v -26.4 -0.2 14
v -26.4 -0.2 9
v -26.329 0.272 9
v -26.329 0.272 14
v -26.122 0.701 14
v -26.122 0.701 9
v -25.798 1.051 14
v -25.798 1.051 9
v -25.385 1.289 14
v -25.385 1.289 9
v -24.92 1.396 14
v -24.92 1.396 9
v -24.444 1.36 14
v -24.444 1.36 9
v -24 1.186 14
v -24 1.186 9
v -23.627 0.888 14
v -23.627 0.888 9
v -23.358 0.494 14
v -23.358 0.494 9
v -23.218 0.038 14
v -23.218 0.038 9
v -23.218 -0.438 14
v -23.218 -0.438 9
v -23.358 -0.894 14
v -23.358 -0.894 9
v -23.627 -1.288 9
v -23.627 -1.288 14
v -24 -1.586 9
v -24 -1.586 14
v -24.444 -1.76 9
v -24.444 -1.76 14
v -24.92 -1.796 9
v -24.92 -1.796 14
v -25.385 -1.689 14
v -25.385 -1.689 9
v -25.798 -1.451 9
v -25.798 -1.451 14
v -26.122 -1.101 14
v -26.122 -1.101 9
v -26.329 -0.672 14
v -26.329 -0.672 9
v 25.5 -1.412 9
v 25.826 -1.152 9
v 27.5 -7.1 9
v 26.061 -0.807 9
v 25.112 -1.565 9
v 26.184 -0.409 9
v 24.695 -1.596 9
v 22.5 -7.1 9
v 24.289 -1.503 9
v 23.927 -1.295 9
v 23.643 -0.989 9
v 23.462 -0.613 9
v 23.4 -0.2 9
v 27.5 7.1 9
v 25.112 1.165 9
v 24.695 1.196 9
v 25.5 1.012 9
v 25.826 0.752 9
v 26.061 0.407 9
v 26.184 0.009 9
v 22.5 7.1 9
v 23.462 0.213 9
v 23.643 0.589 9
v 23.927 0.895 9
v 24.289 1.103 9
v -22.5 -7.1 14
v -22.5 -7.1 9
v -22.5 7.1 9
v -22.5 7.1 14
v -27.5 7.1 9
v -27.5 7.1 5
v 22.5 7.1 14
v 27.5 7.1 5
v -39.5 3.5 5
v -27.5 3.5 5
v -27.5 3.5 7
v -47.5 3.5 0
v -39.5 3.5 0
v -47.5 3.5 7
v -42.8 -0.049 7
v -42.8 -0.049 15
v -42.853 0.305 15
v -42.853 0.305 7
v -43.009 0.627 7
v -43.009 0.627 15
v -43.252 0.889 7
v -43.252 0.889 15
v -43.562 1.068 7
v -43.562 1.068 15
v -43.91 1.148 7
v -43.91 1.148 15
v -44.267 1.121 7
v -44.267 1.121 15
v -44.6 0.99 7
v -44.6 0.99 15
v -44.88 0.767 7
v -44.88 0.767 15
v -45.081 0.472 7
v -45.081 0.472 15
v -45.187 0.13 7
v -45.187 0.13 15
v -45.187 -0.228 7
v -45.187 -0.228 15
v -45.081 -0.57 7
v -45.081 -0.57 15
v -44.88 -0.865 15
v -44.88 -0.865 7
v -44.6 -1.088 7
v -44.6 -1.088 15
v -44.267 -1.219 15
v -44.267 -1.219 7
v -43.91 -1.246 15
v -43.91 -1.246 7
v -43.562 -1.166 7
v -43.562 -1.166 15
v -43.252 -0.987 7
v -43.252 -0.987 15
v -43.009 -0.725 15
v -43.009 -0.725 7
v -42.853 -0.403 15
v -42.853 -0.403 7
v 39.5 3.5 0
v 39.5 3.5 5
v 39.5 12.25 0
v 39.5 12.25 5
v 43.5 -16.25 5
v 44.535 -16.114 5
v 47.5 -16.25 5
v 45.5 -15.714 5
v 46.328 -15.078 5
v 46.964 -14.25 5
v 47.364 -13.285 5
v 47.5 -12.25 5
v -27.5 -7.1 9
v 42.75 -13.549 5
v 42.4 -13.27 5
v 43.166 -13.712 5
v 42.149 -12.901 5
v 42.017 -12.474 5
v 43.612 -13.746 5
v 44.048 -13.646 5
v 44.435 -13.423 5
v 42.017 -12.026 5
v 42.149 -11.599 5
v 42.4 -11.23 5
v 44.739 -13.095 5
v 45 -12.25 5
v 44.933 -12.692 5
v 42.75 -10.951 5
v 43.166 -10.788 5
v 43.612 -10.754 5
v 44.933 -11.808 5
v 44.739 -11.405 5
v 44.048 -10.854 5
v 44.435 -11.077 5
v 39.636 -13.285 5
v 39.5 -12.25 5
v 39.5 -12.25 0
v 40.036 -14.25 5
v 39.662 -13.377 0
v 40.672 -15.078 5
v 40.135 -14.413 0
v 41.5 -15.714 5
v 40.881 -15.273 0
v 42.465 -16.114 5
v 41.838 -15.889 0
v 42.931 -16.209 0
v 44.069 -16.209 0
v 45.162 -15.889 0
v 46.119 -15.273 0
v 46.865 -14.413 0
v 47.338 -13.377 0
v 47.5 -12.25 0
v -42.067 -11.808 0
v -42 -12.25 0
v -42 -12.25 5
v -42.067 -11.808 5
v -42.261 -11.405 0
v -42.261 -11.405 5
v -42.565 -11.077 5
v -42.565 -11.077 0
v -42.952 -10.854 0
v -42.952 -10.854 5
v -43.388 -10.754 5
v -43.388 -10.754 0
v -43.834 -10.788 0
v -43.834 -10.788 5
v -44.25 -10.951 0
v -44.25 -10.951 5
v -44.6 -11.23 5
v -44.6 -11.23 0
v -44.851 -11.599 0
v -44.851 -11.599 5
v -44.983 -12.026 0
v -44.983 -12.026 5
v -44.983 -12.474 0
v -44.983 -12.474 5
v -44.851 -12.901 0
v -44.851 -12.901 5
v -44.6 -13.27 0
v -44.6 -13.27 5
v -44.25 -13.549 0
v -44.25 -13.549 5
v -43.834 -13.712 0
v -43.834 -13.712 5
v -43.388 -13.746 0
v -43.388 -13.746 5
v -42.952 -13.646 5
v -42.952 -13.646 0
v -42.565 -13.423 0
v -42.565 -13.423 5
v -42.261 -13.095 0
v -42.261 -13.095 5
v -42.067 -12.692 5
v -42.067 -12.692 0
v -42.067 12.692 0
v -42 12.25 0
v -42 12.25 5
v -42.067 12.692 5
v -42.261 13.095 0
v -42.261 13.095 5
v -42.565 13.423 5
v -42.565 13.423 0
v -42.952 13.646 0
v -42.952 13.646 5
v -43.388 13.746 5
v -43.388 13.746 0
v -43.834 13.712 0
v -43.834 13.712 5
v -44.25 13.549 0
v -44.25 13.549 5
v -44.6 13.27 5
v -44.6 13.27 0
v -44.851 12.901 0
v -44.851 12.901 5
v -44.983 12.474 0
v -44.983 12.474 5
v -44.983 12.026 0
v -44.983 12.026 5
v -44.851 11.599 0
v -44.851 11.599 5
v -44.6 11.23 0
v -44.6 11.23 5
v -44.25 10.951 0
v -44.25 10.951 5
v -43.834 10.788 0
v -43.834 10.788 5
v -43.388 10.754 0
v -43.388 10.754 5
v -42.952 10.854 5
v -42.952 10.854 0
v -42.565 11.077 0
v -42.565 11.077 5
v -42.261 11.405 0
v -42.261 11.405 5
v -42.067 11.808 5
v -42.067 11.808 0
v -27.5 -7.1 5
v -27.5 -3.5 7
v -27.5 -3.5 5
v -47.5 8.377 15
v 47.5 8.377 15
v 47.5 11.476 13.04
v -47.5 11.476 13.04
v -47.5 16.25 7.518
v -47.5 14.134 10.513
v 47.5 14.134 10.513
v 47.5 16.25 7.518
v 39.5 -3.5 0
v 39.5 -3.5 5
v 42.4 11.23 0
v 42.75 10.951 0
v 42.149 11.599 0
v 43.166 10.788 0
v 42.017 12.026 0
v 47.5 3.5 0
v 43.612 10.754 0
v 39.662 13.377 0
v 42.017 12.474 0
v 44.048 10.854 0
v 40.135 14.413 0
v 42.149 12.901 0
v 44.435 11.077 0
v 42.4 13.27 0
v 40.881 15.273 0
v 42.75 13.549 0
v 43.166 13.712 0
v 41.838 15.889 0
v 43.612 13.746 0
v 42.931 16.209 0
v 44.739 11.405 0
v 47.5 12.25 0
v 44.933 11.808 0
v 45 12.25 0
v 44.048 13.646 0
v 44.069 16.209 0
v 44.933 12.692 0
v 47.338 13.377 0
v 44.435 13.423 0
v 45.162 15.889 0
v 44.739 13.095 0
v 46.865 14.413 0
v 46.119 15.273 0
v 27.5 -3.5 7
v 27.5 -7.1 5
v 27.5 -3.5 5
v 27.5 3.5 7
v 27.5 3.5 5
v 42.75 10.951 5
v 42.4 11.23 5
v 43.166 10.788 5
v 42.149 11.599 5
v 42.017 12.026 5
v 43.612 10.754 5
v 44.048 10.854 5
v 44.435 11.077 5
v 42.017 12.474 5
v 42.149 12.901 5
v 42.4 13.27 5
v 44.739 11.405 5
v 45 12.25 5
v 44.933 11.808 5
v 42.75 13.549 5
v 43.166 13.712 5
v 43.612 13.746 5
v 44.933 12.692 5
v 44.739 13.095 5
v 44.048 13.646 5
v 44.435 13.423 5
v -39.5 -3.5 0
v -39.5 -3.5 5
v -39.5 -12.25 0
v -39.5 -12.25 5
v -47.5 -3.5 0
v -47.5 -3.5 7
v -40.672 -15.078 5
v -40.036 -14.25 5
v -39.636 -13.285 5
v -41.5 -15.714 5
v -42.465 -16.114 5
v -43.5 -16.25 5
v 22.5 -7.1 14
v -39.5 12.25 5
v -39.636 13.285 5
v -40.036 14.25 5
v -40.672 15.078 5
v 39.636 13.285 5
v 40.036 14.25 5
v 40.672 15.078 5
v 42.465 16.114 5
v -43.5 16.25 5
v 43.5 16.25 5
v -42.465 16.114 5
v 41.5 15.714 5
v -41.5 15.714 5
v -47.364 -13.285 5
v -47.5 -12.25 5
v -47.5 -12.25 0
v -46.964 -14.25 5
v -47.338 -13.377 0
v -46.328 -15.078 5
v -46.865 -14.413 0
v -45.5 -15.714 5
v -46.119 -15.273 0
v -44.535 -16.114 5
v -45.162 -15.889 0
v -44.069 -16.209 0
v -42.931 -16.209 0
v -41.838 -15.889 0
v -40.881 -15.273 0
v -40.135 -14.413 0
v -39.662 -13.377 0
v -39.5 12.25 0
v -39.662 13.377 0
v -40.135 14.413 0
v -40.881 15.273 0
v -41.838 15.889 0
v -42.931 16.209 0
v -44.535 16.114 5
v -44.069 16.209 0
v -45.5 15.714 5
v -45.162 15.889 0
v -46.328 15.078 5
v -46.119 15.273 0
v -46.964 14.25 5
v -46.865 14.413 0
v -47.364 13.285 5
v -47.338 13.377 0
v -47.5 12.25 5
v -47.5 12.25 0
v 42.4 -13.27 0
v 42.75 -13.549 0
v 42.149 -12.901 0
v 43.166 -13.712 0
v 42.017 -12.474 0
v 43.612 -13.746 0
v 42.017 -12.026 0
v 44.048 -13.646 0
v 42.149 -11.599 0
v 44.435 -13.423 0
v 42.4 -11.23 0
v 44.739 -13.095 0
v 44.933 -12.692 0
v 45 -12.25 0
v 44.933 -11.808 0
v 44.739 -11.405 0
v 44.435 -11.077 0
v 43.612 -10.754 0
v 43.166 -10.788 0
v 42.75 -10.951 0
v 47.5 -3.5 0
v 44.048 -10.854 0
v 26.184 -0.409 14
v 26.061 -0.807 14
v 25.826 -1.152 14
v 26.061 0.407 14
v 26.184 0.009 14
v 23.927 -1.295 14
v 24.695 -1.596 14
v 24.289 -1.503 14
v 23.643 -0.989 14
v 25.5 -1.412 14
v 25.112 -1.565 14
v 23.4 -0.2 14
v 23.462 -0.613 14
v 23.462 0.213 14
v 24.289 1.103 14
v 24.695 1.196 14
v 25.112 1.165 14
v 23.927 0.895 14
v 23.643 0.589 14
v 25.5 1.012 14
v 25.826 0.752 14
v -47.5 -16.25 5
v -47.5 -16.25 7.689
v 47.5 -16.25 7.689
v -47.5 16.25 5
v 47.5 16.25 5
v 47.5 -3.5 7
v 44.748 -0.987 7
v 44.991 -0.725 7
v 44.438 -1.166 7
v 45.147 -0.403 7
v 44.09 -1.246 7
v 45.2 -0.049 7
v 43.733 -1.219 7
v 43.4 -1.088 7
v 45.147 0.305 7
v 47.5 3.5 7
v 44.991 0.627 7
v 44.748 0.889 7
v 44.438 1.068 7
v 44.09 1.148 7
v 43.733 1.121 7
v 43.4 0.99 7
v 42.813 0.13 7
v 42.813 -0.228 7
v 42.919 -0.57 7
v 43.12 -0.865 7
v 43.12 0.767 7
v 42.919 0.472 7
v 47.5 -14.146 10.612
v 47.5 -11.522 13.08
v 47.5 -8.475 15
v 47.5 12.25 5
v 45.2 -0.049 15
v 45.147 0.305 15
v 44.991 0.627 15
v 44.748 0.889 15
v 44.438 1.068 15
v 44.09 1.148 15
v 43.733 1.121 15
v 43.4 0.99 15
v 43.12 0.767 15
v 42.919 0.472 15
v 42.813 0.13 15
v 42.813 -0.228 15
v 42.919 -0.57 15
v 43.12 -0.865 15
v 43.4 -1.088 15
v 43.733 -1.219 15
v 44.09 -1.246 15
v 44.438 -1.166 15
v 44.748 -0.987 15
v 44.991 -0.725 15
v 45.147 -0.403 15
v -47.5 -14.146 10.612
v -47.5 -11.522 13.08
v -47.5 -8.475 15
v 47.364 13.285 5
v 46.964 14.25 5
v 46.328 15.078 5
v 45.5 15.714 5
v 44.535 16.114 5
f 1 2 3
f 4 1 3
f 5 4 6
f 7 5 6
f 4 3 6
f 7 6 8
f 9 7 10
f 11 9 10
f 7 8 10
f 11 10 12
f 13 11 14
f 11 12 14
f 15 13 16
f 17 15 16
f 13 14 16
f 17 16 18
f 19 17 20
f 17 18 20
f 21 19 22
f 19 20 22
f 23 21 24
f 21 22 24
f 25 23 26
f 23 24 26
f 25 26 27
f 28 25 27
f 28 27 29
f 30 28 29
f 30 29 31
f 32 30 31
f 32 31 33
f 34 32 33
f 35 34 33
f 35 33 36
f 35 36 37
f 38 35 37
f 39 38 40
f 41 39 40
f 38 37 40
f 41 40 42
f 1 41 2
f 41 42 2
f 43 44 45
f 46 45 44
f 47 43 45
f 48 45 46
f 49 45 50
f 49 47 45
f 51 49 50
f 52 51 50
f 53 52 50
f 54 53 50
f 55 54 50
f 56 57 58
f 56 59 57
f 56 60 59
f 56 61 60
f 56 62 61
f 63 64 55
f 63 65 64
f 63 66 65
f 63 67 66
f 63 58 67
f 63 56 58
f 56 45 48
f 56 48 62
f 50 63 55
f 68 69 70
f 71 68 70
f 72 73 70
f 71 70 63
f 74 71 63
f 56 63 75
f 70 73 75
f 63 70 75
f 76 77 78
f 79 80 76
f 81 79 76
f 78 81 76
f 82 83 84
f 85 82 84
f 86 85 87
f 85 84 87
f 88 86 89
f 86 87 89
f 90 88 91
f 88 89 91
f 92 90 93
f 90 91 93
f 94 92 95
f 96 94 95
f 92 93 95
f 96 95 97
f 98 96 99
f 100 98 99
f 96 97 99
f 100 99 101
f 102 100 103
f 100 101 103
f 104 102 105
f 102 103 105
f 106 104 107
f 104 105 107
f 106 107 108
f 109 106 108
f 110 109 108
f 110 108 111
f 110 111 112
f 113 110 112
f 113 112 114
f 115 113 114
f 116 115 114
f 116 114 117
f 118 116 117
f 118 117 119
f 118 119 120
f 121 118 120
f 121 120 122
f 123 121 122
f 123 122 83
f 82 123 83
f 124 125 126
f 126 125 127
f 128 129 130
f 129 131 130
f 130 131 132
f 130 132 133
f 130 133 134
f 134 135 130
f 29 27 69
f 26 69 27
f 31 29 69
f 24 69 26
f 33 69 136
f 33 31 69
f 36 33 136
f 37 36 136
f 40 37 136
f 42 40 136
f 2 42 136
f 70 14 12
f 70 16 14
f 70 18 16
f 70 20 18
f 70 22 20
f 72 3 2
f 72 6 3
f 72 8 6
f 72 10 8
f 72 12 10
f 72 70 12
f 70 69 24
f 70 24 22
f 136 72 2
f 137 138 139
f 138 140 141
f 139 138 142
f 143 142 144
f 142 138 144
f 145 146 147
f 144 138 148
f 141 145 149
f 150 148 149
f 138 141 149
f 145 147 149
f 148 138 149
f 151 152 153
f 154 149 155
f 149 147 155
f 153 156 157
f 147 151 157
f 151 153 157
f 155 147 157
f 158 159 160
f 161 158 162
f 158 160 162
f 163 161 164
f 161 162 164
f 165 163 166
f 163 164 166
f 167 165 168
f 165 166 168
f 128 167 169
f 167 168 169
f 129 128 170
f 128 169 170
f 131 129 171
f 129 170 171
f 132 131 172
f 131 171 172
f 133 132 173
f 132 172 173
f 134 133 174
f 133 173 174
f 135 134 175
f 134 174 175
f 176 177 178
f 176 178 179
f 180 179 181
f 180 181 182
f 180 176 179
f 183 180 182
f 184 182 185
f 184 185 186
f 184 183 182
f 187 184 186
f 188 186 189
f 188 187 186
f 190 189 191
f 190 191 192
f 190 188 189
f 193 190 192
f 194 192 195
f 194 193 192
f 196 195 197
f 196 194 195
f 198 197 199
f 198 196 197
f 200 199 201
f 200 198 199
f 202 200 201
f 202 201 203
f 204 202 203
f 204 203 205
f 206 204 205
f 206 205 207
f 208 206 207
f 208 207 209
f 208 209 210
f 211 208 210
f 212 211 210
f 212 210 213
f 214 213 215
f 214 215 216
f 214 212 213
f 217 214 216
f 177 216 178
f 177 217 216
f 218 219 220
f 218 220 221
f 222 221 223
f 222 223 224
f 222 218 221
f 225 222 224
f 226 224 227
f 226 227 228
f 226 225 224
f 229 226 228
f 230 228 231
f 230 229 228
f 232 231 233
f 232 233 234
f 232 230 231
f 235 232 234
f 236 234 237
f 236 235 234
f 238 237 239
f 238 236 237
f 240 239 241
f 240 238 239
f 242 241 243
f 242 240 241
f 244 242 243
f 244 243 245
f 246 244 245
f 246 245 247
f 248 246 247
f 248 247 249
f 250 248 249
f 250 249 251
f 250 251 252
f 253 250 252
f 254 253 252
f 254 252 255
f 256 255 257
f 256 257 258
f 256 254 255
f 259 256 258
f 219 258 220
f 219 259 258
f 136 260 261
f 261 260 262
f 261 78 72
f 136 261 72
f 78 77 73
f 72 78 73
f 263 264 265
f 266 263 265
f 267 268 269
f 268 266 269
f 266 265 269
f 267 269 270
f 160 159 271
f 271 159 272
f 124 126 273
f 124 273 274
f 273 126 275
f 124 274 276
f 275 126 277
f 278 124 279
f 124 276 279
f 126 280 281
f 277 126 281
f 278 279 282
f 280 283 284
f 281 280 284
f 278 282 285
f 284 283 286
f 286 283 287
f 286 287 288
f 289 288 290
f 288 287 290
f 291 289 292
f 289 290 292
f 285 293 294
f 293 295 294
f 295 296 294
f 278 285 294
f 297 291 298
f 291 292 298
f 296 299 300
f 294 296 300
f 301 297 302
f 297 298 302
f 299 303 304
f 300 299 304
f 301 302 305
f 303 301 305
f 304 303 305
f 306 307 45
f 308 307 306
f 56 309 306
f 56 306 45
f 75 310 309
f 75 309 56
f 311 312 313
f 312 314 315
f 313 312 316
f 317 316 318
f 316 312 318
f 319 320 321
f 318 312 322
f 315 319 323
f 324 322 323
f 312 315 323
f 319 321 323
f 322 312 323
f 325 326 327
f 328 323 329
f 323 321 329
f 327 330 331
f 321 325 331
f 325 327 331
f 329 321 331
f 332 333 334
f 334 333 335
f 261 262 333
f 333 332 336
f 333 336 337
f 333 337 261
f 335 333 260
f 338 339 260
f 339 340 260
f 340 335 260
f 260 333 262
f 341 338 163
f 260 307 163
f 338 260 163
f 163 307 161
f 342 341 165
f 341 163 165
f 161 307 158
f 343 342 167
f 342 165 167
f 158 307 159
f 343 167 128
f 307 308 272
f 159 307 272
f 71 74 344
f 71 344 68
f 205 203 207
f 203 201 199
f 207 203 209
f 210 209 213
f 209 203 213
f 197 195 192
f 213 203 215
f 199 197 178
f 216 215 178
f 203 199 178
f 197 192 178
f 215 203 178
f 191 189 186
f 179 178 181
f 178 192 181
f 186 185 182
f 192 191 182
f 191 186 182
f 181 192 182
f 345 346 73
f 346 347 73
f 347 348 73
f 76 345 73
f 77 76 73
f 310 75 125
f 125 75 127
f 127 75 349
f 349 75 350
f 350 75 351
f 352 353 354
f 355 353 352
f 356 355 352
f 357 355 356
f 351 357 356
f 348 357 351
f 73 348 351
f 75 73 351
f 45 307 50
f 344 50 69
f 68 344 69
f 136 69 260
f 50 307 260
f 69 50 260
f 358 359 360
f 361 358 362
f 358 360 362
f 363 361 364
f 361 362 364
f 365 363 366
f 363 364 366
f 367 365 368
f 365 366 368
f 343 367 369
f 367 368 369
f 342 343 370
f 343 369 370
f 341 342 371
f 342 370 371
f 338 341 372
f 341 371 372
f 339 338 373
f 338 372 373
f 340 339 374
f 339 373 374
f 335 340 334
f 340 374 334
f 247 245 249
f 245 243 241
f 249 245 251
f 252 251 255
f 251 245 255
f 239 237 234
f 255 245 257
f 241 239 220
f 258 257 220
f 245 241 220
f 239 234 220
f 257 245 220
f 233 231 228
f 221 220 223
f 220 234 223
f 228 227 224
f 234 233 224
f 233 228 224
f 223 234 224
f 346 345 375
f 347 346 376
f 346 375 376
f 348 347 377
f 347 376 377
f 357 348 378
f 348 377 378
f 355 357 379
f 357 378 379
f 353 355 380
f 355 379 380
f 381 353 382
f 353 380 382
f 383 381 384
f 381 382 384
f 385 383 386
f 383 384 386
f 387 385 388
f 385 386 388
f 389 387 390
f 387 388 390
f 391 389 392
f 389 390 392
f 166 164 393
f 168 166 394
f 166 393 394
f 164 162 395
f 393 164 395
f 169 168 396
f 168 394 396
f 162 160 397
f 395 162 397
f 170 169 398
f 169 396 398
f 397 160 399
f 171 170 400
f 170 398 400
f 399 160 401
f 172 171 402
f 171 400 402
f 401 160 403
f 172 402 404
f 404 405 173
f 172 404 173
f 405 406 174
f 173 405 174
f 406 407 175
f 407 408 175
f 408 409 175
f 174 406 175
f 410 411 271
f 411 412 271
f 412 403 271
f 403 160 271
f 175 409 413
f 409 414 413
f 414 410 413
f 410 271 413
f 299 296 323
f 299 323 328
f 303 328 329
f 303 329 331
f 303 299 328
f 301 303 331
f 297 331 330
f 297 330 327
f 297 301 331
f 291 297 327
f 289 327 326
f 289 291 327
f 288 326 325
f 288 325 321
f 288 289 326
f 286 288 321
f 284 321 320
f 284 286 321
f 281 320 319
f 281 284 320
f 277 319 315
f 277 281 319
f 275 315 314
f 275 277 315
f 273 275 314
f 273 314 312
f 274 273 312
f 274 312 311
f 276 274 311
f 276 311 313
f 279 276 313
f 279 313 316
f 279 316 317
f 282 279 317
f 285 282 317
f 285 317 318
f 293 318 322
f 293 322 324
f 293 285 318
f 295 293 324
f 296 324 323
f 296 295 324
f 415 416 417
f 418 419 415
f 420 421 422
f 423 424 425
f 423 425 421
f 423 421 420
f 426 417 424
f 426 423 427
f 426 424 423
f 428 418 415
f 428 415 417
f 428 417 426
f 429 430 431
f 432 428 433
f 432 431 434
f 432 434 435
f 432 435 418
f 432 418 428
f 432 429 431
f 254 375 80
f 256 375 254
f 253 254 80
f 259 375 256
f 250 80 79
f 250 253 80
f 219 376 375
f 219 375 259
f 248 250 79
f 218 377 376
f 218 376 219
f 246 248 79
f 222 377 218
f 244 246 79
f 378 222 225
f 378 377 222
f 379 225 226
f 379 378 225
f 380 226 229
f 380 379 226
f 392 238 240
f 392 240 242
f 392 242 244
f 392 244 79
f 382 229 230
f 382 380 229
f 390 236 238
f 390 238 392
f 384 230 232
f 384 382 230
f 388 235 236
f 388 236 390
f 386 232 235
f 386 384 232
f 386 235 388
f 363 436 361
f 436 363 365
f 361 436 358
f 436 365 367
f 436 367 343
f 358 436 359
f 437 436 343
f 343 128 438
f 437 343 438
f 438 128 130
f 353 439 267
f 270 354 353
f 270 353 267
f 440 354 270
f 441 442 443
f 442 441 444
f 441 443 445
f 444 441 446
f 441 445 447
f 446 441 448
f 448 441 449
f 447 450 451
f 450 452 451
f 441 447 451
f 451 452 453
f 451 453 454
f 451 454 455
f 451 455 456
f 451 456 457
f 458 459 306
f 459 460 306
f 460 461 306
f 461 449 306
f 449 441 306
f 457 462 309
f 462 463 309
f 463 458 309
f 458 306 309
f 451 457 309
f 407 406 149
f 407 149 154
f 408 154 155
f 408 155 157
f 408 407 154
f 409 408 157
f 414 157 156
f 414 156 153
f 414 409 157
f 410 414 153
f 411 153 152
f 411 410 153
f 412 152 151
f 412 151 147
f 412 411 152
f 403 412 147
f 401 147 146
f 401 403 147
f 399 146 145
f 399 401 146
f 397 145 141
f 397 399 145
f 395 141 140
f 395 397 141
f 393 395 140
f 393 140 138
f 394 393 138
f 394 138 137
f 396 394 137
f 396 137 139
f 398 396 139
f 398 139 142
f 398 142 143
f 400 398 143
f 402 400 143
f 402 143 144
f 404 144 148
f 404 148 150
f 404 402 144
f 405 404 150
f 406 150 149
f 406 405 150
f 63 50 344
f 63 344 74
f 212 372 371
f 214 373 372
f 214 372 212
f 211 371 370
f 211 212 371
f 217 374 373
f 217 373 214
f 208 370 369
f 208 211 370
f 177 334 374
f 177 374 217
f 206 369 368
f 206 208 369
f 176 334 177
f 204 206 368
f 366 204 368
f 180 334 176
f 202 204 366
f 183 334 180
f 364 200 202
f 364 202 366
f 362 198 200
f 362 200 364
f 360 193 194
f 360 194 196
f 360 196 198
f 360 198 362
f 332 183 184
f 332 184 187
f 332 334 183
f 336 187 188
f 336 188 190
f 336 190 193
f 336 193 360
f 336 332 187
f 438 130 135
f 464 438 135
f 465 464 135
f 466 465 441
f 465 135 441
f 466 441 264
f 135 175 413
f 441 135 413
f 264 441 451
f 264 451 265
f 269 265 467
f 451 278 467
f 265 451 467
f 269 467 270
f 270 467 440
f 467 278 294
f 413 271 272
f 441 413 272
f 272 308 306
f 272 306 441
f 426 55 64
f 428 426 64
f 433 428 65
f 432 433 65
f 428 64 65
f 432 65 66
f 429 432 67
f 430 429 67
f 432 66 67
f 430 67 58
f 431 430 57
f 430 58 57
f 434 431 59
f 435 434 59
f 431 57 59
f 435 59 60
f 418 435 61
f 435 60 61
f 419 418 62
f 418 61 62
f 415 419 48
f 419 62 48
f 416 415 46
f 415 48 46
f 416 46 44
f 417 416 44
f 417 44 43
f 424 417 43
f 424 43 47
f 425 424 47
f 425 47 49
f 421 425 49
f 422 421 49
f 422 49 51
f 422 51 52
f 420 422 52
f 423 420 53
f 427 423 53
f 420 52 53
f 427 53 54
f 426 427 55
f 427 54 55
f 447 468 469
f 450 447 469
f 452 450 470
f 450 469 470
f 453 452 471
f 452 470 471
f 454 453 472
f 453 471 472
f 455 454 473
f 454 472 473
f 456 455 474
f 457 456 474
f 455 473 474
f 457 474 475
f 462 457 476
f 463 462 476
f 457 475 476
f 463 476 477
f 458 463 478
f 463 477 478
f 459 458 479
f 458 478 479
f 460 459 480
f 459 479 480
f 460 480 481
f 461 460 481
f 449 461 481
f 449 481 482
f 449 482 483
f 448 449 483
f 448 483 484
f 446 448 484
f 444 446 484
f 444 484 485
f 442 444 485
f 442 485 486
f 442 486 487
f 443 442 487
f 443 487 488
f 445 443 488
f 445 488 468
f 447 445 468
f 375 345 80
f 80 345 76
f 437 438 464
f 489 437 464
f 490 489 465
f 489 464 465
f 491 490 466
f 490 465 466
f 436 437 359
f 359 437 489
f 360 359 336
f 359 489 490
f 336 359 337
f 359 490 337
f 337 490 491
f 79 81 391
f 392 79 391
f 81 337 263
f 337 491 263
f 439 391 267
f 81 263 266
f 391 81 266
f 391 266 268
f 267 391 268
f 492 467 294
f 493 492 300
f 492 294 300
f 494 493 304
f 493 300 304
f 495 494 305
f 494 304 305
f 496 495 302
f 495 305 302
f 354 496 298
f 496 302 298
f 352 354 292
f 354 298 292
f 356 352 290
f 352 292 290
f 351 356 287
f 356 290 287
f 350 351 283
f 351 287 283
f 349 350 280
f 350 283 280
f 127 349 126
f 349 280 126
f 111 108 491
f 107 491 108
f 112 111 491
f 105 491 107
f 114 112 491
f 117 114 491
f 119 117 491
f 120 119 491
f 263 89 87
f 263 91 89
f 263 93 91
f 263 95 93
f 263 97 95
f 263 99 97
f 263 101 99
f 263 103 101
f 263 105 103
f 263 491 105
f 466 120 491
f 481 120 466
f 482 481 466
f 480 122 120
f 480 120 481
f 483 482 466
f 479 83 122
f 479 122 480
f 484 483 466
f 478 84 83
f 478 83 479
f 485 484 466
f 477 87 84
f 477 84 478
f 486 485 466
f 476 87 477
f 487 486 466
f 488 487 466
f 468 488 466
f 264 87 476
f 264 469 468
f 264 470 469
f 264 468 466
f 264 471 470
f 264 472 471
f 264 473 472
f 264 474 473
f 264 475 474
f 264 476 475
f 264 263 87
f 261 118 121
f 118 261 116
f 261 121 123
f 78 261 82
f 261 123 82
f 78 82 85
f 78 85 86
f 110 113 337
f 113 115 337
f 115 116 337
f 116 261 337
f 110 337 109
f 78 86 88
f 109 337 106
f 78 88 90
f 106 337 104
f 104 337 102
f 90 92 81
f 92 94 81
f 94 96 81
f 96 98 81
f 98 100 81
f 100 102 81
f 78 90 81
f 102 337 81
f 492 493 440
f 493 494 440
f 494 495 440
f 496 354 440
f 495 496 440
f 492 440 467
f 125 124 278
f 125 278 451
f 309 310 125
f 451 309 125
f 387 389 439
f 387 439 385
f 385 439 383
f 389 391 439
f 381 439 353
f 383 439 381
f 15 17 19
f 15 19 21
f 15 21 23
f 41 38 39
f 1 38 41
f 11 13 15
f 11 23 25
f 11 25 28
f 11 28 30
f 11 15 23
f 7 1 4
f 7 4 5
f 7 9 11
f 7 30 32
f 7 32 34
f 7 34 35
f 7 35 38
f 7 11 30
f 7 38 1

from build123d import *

# Parameters (mm, degrees)
SKETCH1_R             = 4
SKETCH1_R_2           = 1.5
BOSS_EXTRUDE1_DEPTH   = 5
BOSS_EXTRUDE1_2_DEPTH = 5
BOSS_EXTRUDE1_3_DEPTH = 5
BOSS_EXTRUDE1_4_DEPTH = 5
SKETCH2_W             = 95
SKETCH2_H             = 32.5
BOSS_EXTRUDE2_DEPTH   = 10
SKETCH3_W             = 45
SKETCH3_H             = 14.2
CUT_EXTRUDE1_DEPTH    = 9
SKETCH4_W             = 5
SKETCH4_H             = 14.2
SKETCH4_W_2           = 45
CUT_EXTRUDE2_DEPTH    = 4
SKETCH5_R             = 1.4
SKETCH5_R_2           = 1.6
CUT_EXTRUDE3_DEPTH    = 5
BOSS_EXTRUDE3_DEPTH   = 5
CUT_EXTRUDE5_DEPTH    = 96
SKETCH9_W             = 7
SKETCH9_H             = 7
CUT_EXTRUDE6_DEPTH    = 96
SKETCH10_R            = 1.2
CUT_EXTRUDE7_DEPTH    = 16


with BuildPart() as part:
    # Sketch1 → Boss-Extrude1 (new body)
    with BuildSketch(Plane.XY):
        with Locations((-43.5, -12.25)):
            Circle(SKETCH1_R)
        with Locations((-43.5, -12.25)):
            Circle(SKETCH1_R_2, mode=Mode.SUBTRACT)
    extrude(amount=BOSS_EXTRUDE1_DEPTH)



with BuildPart() as body_2:
    # Sketch1 → Boss-Extrude1 2 (new body)
    with BuildSketch(Plane.XY):
        with Locations((-43.5, 12.25)):
            Circle(SKETCH1_R)
        with Locations((-43.5, 12.25)):
            Circle(SKETCH1_R_2, mode=Mode.SUBTRACT)
    extrude(amount=BOSS_EXTRUDE1_2_DEPTH)


with BuildPart() as body_3:
    # Sketch1 → Boss-Extrude1 3 (new body)
    with BuildSketch(Plane.XY):
        with Locations((43.5, -12.25)):
            Circle(SKETCH1_R)
        with Locations((43.5, -12.25)):
            Circle(SKETCH1_R_2, mode=Mode.SUBTRACT)
    extrude(amount=BOSS_EXTRUDE1_3_DEPTH)


with BuildPart() as body_4:
    # Sketch1 → Boss-Extrude1 4 (new body)
    with BuildSketch(Plane.XY):
        with Locations((43.5, 12.25)):
            Circle(SKETCH1_R)
        with Locations((43.5, 12.25)):
            Circle(SKETCH1_R_2, mode=Mode.SUBTRACT)
    extrude(amount=BOSS_EXTRUDE1_4_DEPTH)


with BuildPart() as part_1:
    add(part.part)

    add(body_2.part)  # Boss-Extrude2 merges body 2

    add(body_3.part)  # Boss-Extrude2 merges body 3

    add(body_4.part)  # Boss-Extrude2 merges body 4
    # Sketch2 → Boss-Extrude2 (add)
    with BuildSketch(Plane.XY.offset(5)):
        Rectangle(SKETCH2_W, SKETCH2_H)
    extrude(amount=BOSS_EXTRUDE2_DEPTH)

    # Sketch3 → Cut-Extrude1 (cut)
    with BuildSketch(Plane(origin=(0, 0, 5), x_dir=(-1, 0, 0), z_dir=(0, 0, -1))):
        Rectangle(SKETCH3_W, SKETCH3_H)
    extrude(amount=-CUT_EXTRUDE1_DEPTH, mode=Mode.SUBTRACT)

    # Sketch4 → Cut-Extrude2 (cut)
    with BuildSketch(Plane(origin=(0, 0, 5), x_dir=(-1, 0, 0), z_dir=(0, 0, -1))):
        with Locations((-25, 0)):
            Rectangle(SKETCH4_W, SKETCH4_H)
        Rectangle(SKETCH4_W_2, SKETCH4_H)
        with Locations((25, 0)):
            Rectangle(SKETCH4_W, SKETCH4_H)
    extrude(amount=-CUT_EXTRUDE2_DEPTH, mode=Mode.SUBTRACT)

    # Sketch5 → Cut-Extrude3 (cut)
    with BuildSketch(Plane(origin=(0, 0, 9), x_dir=(-1, 0, 0), z_dir=(0, 0, -1))):
        with Locations((-24.8, -0.2)):
            Circle(SKETCH5_R)
        with Locations((24.8, -0.2)):
            Circle(SKETCH5_R_2)
    extrude(amount=-CUT_EXTRUDE3_DEPTH, mode=Mode.SUBTRACT)

    # Sketch6 → Boss-Extrude3 (add)
    with BuildSketch(Plane(origin=(0, 0, 5), x_dir=(-1, 0, 0), z_dir=(0, 0, -1))):
        with BuildLine():
            ThreePointArc((47.5, 12.25), (43.5, 8.25), (39.5, 12.25))
            Line((39.5, 12.25), (39.5, -12.25))
            ThreePointArc((39.5, -12.25), (43.5, -8.25), (47.5, -12.25))
            Line((47.5, -12.25), (47.5, 12.25))
        make_face()
        with BuildLine():
            ThreePointArc((-39.5, 12.25), (-43.5, 8.25), (-47.5, 12.25))
            Line((-47.5, 12.25), (-47.5, -12.25))
            ThreePointArc((-47.5, -12.25), (-43.5, -8.25), (-39.5, -12.25))
            Line((-39.5, -12.25), (-39.5, 12.25))
        make_face()
    extrude(amount=BOSS_EXTRUDE3_DEPTH)

    # Sketch8 → Cut-Extrude5 (cut, through all)
    with BuildSketch(Plane(origin=(47.5, 0, 0), x_dir=(0, 0, -1), z_dir=(1, 0, 0))):
        with BuildLine():
            ThreePointArc((-15, 8.377014021), (-11.841659381, 12.867099577), (-7.518238456, 16.25))
            Line((-7.518238456, 16.25), (-15, 16.25))
            Line((-15, 16.25), (-15, 8.377014021))
        make_face()
        with BuildLine():
            Line((-15, -16.25), (-7.688934819, -16.25))
            ThreePointArc((-7.688934819, -16.25), (-11.909309532, -12.893789895), (-15, -8.475267356))
            Line((-15, -8.475267356), (-15, -16.25))
        make_face()
    extrude(amount=-CUT_EXTRUDE5_DEPTH, mode=Mode.SUBTRACT)

    # Sketch9 → Cut-Extrude6 (cut, through all)
    with BuildSketch(Plane.ZY.offset(47.5)):
        with Locations((3.5, 0)):
            Rectangle(SKETCH9_W, SKETCH9_H)
    extrude(amount=-CUT_EXTRUDE6_DEPTH, mode=Mode.SUBTRACT)

    # Sketch10 → Cut-Extrude7 (cut, through all)
    with BuildSketch(Plane.XY.offset(15)):
        with Locations((-44, -0.049126667)):
            Circle(SKETCH10_R)
        with Locations((44, -0.049126667)):
            Circle(SKETCH10_R)
    extrude(amount=-CUT_EXTRUDE7_DEPTH, mode=Mode.SUBTRACT)


solid = part_1.part
